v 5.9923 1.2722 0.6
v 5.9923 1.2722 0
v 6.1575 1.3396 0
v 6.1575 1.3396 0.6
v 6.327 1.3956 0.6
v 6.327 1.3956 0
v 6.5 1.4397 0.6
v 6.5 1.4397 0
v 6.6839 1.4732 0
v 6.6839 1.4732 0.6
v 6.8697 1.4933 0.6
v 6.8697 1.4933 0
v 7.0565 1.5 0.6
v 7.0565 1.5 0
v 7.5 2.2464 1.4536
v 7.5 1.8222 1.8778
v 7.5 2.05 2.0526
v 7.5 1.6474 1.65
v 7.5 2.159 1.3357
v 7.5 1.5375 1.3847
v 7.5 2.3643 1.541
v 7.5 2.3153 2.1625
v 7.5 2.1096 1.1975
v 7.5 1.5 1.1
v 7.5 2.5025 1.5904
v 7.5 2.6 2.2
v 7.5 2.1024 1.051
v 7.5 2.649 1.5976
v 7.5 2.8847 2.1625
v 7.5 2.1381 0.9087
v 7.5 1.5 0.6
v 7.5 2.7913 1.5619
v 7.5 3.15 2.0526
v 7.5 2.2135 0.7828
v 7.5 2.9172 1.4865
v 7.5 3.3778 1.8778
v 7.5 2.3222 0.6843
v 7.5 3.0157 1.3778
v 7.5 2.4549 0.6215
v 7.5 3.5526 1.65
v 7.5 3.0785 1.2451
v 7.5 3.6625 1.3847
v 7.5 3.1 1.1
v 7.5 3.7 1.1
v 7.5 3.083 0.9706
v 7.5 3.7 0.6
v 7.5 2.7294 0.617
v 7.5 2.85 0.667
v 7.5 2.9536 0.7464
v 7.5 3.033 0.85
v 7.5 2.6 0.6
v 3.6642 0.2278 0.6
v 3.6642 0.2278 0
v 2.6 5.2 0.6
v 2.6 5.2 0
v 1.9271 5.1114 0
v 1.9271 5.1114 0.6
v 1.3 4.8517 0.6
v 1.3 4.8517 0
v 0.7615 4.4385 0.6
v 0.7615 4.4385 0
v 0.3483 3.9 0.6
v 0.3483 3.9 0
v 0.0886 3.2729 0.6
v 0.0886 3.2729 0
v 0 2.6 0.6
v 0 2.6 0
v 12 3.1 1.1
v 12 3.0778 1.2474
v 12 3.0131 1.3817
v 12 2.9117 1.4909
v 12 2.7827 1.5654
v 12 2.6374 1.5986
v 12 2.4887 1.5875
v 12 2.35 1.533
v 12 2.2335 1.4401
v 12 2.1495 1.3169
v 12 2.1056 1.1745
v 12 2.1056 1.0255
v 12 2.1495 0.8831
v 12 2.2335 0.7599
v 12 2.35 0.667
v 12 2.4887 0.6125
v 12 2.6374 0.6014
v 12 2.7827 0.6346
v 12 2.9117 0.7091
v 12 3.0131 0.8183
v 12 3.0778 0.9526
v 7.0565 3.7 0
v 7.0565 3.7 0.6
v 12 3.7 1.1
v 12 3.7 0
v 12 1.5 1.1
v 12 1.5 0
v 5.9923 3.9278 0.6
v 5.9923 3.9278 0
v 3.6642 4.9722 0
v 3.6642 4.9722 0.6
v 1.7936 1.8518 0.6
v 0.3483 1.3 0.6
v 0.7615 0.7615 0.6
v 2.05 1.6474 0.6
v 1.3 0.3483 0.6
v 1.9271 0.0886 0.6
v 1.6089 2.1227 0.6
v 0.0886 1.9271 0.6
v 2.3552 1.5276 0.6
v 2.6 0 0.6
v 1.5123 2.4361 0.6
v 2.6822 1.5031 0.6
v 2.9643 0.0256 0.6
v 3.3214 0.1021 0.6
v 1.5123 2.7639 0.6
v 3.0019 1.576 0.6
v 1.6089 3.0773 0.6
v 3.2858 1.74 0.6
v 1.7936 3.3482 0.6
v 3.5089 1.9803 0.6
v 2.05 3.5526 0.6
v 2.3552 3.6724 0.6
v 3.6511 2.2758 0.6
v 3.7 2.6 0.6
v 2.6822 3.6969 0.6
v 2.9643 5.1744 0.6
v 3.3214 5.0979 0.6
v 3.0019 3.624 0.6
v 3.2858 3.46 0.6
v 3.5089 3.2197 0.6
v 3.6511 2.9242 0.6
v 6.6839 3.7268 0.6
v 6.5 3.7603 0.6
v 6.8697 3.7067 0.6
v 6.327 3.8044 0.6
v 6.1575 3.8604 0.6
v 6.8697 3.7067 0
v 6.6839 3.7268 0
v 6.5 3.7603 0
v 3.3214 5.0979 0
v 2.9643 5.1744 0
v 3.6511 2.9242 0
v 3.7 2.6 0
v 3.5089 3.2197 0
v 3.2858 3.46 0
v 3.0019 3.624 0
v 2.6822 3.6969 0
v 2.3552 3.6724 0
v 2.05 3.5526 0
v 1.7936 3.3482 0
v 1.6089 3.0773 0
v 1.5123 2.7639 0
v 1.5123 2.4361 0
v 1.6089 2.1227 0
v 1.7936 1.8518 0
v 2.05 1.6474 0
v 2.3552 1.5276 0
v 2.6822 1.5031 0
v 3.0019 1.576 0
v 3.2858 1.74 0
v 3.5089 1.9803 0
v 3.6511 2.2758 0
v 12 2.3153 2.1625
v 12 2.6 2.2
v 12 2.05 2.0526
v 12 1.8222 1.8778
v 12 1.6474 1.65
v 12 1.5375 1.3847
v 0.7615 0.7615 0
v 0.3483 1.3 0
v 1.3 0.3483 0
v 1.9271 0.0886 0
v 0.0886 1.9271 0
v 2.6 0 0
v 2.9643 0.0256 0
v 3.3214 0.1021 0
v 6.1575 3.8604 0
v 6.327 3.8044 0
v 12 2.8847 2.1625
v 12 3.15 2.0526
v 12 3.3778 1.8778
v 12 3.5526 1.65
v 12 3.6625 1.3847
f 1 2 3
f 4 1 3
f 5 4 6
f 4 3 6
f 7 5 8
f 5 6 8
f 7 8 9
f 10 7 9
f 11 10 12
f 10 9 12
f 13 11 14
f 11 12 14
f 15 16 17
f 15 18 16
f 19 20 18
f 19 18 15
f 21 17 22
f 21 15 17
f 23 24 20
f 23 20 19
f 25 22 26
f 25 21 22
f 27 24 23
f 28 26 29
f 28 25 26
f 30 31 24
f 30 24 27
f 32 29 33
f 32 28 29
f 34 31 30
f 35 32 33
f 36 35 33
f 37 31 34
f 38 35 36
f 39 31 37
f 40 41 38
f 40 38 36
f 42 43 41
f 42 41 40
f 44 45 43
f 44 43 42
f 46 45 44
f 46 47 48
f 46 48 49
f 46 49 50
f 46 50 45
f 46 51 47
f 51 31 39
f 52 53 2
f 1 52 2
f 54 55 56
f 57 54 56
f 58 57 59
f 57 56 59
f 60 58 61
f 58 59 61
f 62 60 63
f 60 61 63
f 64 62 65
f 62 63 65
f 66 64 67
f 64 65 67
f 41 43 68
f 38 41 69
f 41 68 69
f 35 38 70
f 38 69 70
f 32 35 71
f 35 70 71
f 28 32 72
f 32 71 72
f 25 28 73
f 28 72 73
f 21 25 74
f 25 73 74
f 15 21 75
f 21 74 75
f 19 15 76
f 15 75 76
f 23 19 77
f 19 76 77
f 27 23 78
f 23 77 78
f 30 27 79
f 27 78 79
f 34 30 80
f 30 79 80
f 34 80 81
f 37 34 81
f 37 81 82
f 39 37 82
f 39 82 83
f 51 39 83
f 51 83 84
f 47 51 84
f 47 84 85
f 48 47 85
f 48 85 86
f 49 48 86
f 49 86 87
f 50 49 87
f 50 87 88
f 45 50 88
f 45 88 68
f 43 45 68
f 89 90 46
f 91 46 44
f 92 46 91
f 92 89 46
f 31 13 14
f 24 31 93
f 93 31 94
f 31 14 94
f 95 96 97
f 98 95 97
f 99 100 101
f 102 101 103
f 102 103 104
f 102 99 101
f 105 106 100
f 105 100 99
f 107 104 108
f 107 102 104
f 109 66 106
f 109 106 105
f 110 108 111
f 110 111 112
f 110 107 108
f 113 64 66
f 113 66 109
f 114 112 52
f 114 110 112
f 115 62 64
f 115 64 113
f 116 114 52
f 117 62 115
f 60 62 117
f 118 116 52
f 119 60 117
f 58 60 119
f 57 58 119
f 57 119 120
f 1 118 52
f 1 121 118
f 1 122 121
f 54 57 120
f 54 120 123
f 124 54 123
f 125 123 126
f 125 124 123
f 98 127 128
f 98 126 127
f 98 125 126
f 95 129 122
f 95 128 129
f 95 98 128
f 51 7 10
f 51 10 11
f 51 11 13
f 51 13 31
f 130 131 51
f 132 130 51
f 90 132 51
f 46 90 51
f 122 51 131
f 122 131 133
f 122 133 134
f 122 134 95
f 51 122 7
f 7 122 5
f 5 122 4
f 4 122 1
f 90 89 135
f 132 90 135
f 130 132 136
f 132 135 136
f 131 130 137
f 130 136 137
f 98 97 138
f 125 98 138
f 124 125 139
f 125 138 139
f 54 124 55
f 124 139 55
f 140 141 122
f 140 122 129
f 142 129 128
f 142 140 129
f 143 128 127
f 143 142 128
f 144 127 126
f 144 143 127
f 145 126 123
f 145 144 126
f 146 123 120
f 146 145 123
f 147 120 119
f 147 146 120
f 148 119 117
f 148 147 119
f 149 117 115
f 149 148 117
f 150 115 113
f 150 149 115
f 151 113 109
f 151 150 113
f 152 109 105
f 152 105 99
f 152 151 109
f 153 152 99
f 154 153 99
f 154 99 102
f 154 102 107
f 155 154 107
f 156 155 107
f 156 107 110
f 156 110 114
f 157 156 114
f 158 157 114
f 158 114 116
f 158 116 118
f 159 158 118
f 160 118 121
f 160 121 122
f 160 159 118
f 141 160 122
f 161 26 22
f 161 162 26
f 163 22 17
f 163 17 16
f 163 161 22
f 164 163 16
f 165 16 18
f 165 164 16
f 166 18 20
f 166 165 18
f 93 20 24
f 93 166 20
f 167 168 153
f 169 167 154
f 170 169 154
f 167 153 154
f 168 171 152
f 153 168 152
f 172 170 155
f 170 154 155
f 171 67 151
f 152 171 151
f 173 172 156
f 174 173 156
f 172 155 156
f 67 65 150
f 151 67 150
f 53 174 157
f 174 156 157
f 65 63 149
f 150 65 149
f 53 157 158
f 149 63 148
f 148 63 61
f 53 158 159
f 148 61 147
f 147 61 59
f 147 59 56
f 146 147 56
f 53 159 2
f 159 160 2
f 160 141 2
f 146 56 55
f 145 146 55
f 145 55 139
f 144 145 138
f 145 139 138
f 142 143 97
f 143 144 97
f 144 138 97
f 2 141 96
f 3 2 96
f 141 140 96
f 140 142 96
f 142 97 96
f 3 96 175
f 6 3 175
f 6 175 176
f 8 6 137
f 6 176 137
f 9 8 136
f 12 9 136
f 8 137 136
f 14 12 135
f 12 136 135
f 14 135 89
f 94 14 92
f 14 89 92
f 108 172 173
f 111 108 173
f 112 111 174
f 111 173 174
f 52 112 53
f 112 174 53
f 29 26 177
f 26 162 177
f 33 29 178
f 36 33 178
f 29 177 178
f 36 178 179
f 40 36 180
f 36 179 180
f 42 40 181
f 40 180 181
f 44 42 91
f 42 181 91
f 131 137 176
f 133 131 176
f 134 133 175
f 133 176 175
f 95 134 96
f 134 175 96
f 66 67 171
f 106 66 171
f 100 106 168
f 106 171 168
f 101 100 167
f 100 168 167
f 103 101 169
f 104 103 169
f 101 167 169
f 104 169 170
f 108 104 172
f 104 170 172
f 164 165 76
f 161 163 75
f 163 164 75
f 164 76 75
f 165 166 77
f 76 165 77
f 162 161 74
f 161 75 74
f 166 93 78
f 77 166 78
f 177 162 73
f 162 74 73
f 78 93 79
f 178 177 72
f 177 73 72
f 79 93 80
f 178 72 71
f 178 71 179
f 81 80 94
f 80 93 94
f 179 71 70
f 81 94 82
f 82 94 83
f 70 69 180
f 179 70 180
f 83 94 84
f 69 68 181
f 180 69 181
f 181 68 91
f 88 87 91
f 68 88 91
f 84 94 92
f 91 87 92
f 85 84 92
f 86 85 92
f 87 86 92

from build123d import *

# Parameters (mm, degrees)
F0_W     = 4.5
F0_H     = 2.2
F0_R     = 1.1
F1_DEPTH = 0.6
F2_W     = 4.5
F2_H     = 2.2
F3_DEPTH = 1.6
F4_R     = 1.09999
F5_R     = 0.5
F6_DEPTH = 10


# Not quite as in the source:
# - a fillet or chamfer is up to 0.001 mm smaller than in the source, because OpenCascade refuses the exact size


with BuildPart() as f1:
    # F0 (on Top) → F1 (new body)
    with BuildSketch(Plane.XY):
        with Locations((9.75, 2.6)):
            Rectangle(F0_W, F0_H)
        with BuildLine():
            Line((7.0565025569, 1.5), (7.5, 1.5))
            Line((7.5, 1.5), (7.5, 3.7))
            Line((7.5, 3.7), (7.0565025569, 3.7))
            ThreePointArc((7.0565025569, 3.7), (6.7766250144, 3.7151076306), (6.5, 3.7602549529))
            ThreePointArc((6.5, 3.7602549529), (6.2418088438, 3.8309365837), (5.9922537502, 3.9277912239))
            Line((5.9922537502, 3.9277912239), (3.6642488067, 4.9722087761))
            ThreePointArc((3.6642488067, 4.9722087761), (3.1441769851, 5.1424144841), (2.6, 5.2))
            ThreePointArc((2.6, 5.2), (0.7615223689, 4.4384776311), (0, 2.6))
            ThreePointArc((0, 2.6), (0.7615223689, 0.7615223689), (2.6, 0))
            ThreePointArc((2.6, 0), (3.1441769851, 0.0575855159), (3.6642488067, 0.2277912239))
            Line((3.6642488067, 0.2277912239), (5.9922537502, 1.2722087761))
            ThreePointArc((5.9922537502, 1.2722087761), (6.2418088438, 1.3690634163), (6.5, 1.4397450471))
            ThreePointArc((6.5, 1.4397450471), (6.7766250144, 1.4848923694), (7.0565025569, 1.5))
        make_face()
        with Locations((2.6, 2.6)):
            Circle(F0_R, mode=Mode.SUBTRACT)
    extrude(amount=F1_DEPTH)

    # F2 (on face) → F3 (join)
    with BuildSketch(Plane.XY.offset(0.6)):
        with Locations((9.75, 2.6)):
            Rectangle(F2_W, F2_H)
    extrude(amount=F3_DEPTH)

    # F4 (radius 1.1 in the source; OpenCascade refuses exactly that, so slightly less here)
    f4_edges = [f1.edges().sort_by_distance(p)[0] for p in [
        (9.75, 1.5, 2.2),
        (9.75, 3.7, 2.2),
    ]]
    fillet(f4_edges, radius=F4_R)

    # F5 (on face) → F6 (cut)
    with BuildSketch(Plane.YZ.offset(12)):
        with Locations((2.6, 1.1)):
            Circle(F5_R)
    extrude(amount=-F6_DEPTH, mode=Mode.SUBTRACT)


solid = f1.part
